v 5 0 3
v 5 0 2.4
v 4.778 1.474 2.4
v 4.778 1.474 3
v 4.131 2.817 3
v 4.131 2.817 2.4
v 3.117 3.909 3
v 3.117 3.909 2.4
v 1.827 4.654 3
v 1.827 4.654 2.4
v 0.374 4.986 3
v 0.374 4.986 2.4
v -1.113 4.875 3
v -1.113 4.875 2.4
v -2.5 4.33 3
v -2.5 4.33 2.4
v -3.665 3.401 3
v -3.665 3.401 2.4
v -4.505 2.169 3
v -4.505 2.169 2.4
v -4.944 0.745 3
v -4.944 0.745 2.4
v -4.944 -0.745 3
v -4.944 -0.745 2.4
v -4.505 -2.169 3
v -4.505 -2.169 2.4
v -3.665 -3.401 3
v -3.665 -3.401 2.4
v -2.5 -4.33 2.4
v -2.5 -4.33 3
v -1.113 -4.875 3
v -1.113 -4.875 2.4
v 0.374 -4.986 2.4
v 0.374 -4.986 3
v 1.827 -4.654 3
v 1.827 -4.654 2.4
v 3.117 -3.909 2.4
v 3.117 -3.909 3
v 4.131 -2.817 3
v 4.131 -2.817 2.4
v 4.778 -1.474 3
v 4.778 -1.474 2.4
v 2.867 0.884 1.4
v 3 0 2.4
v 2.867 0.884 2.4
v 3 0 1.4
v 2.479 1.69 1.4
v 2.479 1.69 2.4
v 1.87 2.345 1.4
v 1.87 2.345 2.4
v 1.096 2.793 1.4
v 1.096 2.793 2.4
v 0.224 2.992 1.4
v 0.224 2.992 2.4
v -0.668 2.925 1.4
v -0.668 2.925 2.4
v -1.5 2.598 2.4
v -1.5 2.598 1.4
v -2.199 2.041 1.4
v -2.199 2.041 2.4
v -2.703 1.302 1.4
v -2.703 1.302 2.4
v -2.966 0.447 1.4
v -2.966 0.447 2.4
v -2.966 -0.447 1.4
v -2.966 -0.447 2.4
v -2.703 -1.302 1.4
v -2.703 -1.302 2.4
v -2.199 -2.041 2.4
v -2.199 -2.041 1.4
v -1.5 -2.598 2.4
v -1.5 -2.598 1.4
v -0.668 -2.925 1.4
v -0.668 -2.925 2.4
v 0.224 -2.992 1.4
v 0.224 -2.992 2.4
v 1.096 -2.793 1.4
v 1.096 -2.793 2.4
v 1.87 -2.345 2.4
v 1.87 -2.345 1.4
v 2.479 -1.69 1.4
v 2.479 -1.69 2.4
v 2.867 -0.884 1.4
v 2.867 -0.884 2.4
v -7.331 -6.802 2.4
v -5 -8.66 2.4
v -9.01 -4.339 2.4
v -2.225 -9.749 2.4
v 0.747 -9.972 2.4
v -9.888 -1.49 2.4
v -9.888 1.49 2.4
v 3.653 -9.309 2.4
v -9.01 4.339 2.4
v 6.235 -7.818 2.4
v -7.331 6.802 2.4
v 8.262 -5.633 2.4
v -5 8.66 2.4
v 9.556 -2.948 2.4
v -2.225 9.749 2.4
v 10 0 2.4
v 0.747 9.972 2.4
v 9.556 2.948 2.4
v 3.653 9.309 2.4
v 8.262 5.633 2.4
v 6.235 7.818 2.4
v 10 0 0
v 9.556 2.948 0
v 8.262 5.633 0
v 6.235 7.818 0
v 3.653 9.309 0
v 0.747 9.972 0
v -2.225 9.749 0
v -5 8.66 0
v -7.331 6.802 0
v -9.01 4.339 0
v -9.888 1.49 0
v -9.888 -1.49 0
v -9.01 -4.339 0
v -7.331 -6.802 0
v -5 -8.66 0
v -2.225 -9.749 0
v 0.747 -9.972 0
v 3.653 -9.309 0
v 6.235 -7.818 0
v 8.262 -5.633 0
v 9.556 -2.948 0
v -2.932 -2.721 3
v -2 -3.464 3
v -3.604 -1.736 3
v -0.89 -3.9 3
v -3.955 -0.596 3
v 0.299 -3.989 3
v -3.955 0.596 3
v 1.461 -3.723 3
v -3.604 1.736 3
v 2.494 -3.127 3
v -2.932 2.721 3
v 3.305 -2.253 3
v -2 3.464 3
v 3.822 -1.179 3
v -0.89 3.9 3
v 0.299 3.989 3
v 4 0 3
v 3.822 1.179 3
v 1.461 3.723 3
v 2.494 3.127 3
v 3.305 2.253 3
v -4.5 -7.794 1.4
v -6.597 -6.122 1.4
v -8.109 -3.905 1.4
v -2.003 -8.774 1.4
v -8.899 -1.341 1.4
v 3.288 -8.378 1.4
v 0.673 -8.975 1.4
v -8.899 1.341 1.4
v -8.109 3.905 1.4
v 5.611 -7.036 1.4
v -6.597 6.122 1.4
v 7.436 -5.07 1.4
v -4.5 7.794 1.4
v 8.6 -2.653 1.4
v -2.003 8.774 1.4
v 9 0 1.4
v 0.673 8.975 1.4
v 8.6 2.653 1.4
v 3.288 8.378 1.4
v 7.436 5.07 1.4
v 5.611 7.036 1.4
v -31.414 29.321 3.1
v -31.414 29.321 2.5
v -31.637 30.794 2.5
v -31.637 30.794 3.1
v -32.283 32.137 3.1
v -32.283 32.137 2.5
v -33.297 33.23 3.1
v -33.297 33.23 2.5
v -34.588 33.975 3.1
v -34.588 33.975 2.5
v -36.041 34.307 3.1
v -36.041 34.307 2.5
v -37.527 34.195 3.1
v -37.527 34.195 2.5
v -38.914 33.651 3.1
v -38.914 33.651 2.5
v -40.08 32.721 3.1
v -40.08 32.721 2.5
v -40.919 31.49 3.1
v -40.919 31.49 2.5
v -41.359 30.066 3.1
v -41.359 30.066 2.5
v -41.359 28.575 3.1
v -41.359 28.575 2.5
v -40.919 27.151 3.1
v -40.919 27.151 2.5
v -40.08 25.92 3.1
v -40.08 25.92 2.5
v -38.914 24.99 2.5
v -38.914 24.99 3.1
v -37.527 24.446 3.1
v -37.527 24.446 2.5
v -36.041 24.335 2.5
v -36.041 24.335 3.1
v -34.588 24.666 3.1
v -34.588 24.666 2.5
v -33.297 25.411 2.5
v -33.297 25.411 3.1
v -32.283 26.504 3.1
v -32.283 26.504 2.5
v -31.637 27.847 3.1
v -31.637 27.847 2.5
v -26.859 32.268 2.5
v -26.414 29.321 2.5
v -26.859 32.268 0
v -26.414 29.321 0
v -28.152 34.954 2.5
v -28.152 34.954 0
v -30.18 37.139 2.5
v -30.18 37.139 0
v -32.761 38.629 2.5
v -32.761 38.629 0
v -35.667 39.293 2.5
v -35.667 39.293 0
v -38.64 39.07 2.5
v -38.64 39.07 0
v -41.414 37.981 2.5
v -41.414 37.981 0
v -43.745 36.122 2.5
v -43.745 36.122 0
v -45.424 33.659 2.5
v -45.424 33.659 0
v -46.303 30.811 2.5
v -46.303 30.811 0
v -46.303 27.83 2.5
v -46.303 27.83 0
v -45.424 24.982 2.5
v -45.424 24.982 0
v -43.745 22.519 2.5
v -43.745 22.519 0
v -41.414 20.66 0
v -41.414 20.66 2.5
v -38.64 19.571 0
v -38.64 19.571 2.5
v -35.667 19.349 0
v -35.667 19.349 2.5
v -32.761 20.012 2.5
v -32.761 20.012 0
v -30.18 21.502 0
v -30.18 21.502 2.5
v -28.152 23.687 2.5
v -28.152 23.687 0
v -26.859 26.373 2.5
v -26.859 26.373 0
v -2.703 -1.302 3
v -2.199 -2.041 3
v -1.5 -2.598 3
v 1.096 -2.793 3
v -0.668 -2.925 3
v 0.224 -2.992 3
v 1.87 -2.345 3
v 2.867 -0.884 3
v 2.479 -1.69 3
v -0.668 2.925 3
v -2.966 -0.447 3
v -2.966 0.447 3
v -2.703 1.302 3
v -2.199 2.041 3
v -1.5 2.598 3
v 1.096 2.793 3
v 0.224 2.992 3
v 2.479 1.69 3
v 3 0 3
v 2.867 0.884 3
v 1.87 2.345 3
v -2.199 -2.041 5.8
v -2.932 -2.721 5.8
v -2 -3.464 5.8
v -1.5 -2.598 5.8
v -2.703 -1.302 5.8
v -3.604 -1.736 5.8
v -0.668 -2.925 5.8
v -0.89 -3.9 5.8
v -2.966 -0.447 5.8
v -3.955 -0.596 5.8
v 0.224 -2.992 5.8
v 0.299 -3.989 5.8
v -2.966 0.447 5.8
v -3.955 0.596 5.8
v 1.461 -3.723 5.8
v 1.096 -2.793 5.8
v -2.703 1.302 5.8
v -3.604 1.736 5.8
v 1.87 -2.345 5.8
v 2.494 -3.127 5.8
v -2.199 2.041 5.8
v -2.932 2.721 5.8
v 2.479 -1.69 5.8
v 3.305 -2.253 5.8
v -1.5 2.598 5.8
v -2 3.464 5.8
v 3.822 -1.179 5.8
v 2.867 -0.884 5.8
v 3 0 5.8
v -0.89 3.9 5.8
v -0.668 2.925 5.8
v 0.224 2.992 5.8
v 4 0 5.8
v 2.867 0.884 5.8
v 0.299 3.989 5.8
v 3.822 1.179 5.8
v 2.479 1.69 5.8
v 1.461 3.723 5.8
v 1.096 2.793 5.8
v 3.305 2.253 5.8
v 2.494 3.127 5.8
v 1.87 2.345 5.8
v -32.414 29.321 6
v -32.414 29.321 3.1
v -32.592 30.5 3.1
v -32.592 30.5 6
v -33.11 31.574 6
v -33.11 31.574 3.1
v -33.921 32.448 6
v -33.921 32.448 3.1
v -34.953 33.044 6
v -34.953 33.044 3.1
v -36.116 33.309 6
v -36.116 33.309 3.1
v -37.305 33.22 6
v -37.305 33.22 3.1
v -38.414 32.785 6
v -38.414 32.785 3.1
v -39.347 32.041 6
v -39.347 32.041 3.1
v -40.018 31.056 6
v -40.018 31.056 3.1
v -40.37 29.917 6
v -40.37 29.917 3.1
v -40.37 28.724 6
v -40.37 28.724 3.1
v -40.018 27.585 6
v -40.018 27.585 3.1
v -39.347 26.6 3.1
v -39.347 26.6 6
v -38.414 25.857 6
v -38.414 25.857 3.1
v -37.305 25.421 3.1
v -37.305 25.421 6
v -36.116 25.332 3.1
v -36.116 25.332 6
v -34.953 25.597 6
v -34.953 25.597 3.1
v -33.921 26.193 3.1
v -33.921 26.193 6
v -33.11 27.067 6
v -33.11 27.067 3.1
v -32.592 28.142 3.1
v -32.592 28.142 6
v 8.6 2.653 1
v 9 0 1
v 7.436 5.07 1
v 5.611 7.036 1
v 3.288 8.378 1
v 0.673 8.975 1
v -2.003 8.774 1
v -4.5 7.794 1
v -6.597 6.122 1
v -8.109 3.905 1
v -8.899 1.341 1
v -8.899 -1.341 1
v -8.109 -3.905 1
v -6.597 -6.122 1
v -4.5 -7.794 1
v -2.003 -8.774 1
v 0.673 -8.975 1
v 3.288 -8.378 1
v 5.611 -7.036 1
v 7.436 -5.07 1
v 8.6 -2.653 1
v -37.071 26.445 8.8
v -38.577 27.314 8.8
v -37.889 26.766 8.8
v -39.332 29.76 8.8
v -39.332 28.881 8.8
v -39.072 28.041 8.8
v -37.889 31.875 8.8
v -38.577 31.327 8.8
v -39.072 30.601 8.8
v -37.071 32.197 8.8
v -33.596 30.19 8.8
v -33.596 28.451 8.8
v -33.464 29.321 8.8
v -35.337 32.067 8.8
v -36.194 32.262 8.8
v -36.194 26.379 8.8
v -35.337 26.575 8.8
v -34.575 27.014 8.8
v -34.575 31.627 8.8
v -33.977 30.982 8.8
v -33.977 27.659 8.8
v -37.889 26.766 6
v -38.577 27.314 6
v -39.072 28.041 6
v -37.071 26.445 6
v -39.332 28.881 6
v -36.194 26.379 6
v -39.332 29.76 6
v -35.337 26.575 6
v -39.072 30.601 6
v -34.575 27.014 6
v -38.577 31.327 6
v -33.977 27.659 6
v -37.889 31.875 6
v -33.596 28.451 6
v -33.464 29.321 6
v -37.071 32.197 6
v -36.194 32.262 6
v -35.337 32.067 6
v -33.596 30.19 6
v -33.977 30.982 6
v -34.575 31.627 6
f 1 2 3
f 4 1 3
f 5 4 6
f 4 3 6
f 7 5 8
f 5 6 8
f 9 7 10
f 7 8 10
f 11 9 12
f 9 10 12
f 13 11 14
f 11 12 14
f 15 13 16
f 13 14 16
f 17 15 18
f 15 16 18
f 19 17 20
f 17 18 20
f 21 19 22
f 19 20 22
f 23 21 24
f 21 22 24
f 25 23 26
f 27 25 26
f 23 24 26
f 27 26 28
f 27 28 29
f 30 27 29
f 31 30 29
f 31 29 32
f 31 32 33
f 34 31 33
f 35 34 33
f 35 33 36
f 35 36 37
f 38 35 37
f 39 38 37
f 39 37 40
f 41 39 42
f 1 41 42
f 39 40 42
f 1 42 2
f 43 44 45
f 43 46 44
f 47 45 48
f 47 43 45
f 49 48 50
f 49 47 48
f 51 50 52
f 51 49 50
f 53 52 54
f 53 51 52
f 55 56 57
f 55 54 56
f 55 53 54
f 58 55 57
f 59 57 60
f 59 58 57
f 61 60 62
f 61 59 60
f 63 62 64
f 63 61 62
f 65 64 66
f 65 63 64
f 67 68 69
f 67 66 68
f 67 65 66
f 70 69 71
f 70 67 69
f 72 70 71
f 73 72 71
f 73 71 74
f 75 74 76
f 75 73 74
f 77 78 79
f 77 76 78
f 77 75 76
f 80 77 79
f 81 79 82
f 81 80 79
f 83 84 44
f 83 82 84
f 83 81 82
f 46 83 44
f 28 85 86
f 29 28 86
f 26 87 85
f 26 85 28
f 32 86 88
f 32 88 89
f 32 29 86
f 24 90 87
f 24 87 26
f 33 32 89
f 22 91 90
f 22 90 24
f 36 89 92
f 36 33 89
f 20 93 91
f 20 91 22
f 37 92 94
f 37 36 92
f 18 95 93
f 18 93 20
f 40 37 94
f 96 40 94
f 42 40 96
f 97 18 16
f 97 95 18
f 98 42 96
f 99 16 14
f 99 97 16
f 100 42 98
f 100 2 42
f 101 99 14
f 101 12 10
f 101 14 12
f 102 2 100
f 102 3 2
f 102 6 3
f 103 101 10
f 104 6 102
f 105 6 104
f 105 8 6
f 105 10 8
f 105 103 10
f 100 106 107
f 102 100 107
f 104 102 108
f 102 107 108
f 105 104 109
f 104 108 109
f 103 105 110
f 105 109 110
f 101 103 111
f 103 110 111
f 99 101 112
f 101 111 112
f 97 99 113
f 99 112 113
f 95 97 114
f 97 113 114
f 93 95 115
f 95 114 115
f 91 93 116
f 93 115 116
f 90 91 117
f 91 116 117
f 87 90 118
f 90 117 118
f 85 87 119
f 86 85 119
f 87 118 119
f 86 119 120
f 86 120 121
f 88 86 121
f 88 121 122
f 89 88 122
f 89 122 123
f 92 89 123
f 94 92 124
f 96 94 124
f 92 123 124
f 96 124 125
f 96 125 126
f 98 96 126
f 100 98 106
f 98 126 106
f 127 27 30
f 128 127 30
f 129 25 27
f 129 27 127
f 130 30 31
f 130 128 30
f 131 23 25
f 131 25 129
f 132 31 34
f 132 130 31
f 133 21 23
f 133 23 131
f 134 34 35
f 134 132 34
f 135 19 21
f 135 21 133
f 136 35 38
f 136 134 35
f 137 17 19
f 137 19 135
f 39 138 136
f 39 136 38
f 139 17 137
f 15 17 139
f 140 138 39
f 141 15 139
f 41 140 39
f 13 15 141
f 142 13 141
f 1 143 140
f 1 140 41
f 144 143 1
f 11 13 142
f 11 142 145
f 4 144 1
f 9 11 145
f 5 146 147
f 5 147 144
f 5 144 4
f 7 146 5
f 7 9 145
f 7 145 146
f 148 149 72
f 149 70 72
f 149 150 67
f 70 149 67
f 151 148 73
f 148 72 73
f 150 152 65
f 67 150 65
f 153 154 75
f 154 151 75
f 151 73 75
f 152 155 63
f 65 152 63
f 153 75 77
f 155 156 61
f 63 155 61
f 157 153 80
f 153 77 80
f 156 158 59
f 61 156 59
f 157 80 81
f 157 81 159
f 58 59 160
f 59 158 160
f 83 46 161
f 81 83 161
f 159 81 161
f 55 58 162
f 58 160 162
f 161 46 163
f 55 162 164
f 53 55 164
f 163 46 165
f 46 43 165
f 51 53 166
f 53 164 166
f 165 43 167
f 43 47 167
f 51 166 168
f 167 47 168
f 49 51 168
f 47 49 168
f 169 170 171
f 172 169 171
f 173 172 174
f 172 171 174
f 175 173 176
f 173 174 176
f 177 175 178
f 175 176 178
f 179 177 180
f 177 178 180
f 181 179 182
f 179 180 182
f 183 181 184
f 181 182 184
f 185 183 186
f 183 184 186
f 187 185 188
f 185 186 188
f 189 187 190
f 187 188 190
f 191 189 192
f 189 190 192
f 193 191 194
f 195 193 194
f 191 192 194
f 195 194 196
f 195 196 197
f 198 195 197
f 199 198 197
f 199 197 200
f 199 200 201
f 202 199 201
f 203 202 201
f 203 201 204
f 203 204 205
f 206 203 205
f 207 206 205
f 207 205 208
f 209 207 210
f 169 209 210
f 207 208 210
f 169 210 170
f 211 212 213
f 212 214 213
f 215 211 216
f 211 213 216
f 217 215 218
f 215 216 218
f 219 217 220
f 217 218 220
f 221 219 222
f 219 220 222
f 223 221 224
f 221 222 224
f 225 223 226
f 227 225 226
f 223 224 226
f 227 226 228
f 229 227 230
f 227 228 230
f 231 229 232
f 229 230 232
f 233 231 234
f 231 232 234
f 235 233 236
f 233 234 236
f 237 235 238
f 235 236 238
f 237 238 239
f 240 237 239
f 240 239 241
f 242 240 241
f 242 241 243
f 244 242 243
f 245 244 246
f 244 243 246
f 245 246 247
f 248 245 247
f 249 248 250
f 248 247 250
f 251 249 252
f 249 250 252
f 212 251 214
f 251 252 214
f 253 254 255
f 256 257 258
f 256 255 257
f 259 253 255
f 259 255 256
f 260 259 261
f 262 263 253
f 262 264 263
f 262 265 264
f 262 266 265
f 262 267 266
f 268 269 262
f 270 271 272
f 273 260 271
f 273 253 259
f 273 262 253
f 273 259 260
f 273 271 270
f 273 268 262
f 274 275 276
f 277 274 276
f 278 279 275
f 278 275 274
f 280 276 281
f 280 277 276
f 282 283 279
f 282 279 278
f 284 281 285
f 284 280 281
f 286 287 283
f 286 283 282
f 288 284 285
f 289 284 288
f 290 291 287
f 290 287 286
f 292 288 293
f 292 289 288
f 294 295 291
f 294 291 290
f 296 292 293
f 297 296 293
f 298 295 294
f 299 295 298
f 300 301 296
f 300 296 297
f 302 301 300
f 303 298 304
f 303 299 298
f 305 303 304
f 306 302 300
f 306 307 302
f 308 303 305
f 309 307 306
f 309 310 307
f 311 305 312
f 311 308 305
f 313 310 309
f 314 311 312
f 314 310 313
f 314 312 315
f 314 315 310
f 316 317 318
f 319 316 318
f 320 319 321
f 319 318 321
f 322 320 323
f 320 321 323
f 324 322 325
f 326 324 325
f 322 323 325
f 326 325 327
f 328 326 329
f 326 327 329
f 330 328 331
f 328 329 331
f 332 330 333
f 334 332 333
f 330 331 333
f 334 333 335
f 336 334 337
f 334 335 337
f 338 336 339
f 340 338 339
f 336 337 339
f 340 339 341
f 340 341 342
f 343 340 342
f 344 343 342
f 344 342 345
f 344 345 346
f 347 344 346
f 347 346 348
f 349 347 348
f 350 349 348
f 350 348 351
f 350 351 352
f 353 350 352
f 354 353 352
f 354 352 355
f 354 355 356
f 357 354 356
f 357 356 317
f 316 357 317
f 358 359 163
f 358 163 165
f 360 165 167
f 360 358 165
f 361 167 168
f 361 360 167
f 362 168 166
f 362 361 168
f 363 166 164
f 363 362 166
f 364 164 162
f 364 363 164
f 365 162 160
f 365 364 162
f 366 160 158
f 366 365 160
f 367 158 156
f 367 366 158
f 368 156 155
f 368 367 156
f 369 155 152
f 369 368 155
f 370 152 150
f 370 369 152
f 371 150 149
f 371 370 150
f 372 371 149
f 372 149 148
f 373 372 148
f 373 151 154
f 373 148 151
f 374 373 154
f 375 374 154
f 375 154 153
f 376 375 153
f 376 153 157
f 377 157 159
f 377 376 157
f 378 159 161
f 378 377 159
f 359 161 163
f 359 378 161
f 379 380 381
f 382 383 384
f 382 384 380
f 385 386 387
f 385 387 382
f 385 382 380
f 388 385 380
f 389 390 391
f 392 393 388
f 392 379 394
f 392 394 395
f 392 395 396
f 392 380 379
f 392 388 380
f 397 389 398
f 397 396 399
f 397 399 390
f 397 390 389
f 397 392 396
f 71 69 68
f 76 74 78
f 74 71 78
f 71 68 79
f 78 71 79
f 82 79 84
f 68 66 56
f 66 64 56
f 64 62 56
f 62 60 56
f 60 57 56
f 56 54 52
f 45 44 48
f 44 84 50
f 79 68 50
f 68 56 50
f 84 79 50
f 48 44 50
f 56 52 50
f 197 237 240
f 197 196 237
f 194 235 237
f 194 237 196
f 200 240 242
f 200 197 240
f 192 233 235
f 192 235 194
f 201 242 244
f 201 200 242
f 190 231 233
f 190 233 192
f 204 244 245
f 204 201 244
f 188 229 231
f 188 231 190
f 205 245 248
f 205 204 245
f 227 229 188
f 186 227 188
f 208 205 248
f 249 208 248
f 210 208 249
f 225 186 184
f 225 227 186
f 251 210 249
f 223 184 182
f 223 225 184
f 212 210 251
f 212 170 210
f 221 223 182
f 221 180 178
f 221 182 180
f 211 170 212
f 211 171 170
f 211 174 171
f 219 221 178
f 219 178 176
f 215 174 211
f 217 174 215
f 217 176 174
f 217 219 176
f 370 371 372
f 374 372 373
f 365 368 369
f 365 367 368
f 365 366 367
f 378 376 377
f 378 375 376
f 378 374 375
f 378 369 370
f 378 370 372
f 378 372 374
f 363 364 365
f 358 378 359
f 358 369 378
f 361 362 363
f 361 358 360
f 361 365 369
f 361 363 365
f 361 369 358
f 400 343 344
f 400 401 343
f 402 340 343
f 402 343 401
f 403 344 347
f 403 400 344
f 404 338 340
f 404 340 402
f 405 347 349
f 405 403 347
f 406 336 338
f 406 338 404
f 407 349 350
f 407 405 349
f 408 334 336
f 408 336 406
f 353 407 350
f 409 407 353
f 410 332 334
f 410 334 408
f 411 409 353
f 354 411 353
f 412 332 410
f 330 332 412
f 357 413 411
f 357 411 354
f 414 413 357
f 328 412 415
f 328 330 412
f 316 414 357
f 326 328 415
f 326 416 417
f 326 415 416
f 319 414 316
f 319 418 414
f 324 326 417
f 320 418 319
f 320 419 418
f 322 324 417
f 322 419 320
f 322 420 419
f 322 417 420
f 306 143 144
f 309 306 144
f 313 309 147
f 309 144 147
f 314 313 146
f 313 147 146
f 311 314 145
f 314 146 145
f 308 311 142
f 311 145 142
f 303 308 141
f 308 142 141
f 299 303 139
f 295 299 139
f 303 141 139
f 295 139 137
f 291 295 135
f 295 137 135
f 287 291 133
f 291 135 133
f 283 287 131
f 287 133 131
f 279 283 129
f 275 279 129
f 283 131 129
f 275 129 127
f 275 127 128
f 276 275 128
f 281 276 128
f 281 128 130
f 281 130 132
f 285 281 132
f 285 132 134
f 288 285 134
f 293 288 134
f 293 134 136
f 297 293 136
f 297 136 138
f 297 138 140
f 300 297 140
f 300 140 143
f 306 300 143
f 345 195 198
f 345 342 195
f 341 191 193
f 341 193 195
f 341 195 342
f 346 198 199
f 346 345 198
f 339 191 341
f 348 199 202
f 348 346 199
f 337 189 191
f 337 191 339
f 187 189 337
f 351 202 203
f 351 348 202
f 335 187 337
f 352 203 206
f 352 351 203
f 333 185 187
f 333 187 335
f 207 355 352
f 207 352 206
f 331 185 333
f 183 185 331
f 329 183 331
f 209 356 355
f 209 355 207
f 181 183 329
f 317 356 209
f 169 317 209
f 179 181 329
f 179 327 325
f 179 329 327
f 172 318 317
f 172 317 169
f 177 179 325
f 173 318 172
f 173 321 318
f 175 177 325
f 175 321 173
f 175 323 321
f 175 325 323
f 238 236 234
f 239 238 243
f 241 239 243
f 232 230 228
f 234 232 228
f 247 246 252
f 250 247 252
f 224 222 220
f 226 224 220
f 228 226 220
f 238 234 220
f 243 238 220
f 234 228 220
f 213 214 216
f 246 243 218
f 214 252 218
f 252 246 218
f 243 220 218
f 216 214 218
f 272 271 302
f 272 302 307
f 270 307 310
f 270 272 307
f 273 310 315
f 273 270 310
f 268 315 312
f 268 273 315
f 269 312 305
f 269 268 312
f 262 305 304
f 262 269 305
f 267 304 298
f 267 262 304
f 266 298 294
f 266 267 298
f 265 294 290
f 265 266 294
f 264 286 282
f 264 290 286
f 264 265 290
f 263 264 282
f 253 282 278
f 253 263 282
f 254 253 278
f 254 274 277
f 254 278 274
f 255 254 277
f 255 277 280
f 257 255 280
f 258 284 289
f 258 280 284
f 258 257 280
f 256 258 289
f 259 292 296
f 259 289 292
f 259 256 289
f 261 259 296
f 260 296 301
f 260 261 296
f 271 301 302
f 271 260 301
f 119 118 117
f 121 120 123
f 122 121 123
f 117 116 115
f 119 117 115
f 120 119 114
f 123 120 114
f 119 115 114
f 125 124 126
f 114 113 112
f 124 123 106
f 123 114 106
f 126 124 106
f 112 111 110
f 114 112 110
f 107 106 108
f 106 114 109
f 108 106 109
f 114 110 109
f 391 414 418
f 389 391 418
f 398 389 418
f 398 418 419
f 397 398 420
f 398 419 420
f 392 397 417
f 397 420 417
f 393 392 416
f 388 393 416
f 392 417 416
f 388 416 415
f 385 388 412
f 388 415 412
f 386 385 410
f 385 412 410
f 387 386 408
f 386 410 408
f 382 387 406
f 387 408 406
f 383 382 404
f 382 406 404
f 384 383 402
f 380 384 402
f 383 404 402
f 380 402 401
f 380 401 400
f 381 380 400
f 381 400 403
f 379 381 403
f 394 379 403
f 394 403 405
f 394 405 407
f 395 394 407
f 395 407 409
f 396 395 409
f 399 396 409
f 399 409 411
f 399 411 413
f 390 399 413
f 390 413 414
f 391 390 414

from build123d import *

# Parameters (mm, degrees)
F0_R      = 10
F1_DEPTH  = 2.4
F2_R      = 4
F3_DEPTH  = 3.4
F4_T      = -1
F5_R      = 5
F6_DEPTH  = 0.6
F7_R      = 10
F8_DEPTH  = 2.5
F9_R      = 4
F10_DEPTH = 3.5
F11_R     = 2.95
F12_DEPTH = 2.8
F13_R     = 5
F13_R_2   = 4
F14_DEPTH = 0.6


with BuildPart() as f1:
    # F0 (on Top) → F1 (new body)
    with BuildSketch(Plane.XY):
        Circle(F0_R)
    extrude(amount=F1_DEPTH)

    # F2 (on face) → F3 (join)
    with BuildSketch(Plane.XY.offset(2.4)):
        Circle(F2_R)
    extrude(amount=F3_DEPTH)

    # F4
    f4_openings = [f1.faces().sort_by_distance(p)[0] for p in [
        (0, 0, 5.8),
    ]]
    offset(amount=F4_T, openings=f4_openings, kind=Kind.INTERSECTION)

    # F5 (on face) → F6 (join)
    with BuildSketch(Plane.XY.offset(2.4)):
        Circle(F5_R)
    extrude(amount=F6_DEPTH)


with BuildPart() as f8:
    # F7 (on Top) → F8 (new body)
    with BuildSketch(Plane.XY):
        with Locations((-36.4144779742, 29.3206144124)):
            Circle(F7_R)
    extrude(amount=F8_DEPTH)

    # F9 (on face) → F10 (join)
    with BuildSketch(Plane.XY.offset(2.5)):
        with Locations((-36.4144779742, 29.3206144124)):
            Circle(F9_R)
    extrude(amount=F10_DEPTH)

    # F11 (on face) → F12 (join)
    with BuildSketch(Plane.XY.offset(6)):
        with Locations((-36.4144779742, 29.3206144124)):
            Circle(F11_R)
    extrude(amount=F12_DEPTH)

    # F13 (on face) + F11 (on face) + F9 (on face) + F7 (on Top) → F14 (join)
    with BuildSketch(Plane.XY.offset(2.5)):
        with Locations((-36.4144779742, 29.3206144124)):
            Circle(F13_R)
        with Locations((-36.4144779742, 29.3206144124)):
            Circle(F13_R_2, mode=Mode.SUBTRACT)
    with BuildSketch(Plane.XY.offset(6)):
        with Locations((-36.4144779742, 29.3206144124)):
            Circle(F11_R)
    with BuildSketch(Plane.XY.offset(2.5)):
        with Locations((-36.4144779742, 29.3206144124)):
            Circle(F9_R)
    with BuildSketch(Plane.XY):
        with Locations((-36.4144779742, 29.3206144124)):
            Circle(F7_R)
    extrude(amount=F14_DEPTH)


solid = Compound([f1.part, f8.part])
